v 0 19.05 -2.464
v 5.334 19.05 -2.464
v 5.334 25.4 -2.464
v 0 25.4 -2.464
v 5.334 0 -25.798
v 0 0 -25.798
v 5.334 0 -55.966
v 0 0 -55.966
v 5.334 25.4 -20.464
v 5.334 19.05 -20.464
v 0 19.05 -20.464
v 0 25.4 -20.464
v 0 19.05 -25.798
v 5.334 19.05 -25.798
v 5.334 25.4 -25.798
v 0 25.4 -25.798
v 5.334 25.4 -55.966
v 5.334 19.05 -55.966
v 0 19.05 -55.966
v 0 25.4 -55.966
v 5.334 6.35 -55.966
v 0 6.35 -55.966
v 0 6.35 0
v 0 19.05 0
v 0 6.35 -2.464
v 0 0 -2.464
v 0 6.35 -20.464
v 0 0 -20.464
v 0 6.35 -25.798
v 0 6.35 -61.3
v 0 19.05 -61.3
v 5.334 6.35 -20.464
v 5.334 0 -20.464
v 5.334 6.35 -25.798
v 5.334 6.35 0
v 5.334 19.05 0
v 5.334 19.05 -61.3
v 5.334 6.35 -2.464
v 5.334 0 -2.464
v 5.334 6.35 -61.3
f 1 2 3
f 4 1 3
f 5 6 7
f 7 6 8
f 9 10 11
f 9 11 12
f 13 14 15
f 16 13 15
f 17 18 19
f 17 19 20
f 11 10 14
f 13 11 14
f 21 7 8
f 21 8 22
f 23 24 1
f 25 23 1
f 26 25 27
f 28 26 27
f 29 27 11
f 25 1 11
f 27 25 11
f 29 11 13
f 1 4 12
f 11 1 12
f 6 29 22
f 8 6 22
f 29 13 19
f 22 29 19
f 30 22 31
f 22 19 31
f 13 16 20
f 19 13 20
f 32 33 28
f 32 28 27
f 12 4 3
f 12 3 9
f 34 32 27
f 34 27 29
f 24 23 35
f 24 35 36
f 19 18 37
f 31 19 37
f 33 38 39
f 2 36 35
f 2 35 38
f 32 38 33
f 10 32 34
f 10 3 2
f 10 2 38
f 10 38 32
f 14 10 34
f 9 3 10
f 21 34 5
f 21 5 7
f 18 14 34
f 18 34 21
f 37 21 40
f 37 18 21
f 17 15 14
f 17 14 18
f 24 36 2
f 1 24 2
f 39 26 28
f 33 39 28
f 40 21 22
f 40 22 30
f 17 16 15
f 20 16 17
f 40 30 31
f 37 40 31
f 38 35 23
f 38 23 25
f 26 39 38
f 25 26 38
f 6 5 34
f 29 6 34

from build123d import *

# Parameters (mm, degrees)
SKETCH1_W           = 61.3
SKETCH1_H           = 25.4
BOSS_EXTRUDE1_DEPTH = 5.334
SKETCH2_W           = 2.4638
SKETCH2_H           = 6.35
SKETCH2_W_2         = 5.334
CUT_EXTRUDE1_DEPTH  = 67.568022023


with BuildPart() as part:
    # Sketch1 → Boss-Extrude1 (new body)
    with BuildSketch(Plane(origin=(0, 0, 0), x_dir=(0, 0, -1), z_dir=(1, 0, 0))):
        with Locations((30.65, 12.7)):
            Rectangle(SKETCH1_W, SKETCH1_H)
    extrude(amount=BOSS_EXTRUDE1_DEPTH)

    # Sketch2 → Cut-Extrude1 (cut, through all)
    with BuildSketch(Plane(origin=(5.334, 0, 0), x_dir=(0, 0, -1), z_dir=(1, 0, 0))):
        with Locations((1.2319, 22.225)):
            Rectangle(SKETCH2_W, SKETCH2_H)
        with Locations((1.2319, 3.175)):
            Rectangle(SKETCH2_W, SKETCH2_H)
        with Locations((23.1308, 22.225)):
            Rectangle(SKETCH2_W_2, SKETCH2_H)
        with Locations((23.1308, 3.175)):
            Rectangle(SKETCH2_W_2, SKETCH2_H)
        with Locations((58.633, 3.175)):
            Rectangle(SKETCH2_W_2, SKETCH2_H)
        with Locations((58.633, 22.225)):
            Rectangle(SKETCH2_W_2, SKETCH2_H)
    extrude(amount=-CUT_EXTRUDE1_DEPTH, mode=Mode.SUBTRACT)


solid = part.part
